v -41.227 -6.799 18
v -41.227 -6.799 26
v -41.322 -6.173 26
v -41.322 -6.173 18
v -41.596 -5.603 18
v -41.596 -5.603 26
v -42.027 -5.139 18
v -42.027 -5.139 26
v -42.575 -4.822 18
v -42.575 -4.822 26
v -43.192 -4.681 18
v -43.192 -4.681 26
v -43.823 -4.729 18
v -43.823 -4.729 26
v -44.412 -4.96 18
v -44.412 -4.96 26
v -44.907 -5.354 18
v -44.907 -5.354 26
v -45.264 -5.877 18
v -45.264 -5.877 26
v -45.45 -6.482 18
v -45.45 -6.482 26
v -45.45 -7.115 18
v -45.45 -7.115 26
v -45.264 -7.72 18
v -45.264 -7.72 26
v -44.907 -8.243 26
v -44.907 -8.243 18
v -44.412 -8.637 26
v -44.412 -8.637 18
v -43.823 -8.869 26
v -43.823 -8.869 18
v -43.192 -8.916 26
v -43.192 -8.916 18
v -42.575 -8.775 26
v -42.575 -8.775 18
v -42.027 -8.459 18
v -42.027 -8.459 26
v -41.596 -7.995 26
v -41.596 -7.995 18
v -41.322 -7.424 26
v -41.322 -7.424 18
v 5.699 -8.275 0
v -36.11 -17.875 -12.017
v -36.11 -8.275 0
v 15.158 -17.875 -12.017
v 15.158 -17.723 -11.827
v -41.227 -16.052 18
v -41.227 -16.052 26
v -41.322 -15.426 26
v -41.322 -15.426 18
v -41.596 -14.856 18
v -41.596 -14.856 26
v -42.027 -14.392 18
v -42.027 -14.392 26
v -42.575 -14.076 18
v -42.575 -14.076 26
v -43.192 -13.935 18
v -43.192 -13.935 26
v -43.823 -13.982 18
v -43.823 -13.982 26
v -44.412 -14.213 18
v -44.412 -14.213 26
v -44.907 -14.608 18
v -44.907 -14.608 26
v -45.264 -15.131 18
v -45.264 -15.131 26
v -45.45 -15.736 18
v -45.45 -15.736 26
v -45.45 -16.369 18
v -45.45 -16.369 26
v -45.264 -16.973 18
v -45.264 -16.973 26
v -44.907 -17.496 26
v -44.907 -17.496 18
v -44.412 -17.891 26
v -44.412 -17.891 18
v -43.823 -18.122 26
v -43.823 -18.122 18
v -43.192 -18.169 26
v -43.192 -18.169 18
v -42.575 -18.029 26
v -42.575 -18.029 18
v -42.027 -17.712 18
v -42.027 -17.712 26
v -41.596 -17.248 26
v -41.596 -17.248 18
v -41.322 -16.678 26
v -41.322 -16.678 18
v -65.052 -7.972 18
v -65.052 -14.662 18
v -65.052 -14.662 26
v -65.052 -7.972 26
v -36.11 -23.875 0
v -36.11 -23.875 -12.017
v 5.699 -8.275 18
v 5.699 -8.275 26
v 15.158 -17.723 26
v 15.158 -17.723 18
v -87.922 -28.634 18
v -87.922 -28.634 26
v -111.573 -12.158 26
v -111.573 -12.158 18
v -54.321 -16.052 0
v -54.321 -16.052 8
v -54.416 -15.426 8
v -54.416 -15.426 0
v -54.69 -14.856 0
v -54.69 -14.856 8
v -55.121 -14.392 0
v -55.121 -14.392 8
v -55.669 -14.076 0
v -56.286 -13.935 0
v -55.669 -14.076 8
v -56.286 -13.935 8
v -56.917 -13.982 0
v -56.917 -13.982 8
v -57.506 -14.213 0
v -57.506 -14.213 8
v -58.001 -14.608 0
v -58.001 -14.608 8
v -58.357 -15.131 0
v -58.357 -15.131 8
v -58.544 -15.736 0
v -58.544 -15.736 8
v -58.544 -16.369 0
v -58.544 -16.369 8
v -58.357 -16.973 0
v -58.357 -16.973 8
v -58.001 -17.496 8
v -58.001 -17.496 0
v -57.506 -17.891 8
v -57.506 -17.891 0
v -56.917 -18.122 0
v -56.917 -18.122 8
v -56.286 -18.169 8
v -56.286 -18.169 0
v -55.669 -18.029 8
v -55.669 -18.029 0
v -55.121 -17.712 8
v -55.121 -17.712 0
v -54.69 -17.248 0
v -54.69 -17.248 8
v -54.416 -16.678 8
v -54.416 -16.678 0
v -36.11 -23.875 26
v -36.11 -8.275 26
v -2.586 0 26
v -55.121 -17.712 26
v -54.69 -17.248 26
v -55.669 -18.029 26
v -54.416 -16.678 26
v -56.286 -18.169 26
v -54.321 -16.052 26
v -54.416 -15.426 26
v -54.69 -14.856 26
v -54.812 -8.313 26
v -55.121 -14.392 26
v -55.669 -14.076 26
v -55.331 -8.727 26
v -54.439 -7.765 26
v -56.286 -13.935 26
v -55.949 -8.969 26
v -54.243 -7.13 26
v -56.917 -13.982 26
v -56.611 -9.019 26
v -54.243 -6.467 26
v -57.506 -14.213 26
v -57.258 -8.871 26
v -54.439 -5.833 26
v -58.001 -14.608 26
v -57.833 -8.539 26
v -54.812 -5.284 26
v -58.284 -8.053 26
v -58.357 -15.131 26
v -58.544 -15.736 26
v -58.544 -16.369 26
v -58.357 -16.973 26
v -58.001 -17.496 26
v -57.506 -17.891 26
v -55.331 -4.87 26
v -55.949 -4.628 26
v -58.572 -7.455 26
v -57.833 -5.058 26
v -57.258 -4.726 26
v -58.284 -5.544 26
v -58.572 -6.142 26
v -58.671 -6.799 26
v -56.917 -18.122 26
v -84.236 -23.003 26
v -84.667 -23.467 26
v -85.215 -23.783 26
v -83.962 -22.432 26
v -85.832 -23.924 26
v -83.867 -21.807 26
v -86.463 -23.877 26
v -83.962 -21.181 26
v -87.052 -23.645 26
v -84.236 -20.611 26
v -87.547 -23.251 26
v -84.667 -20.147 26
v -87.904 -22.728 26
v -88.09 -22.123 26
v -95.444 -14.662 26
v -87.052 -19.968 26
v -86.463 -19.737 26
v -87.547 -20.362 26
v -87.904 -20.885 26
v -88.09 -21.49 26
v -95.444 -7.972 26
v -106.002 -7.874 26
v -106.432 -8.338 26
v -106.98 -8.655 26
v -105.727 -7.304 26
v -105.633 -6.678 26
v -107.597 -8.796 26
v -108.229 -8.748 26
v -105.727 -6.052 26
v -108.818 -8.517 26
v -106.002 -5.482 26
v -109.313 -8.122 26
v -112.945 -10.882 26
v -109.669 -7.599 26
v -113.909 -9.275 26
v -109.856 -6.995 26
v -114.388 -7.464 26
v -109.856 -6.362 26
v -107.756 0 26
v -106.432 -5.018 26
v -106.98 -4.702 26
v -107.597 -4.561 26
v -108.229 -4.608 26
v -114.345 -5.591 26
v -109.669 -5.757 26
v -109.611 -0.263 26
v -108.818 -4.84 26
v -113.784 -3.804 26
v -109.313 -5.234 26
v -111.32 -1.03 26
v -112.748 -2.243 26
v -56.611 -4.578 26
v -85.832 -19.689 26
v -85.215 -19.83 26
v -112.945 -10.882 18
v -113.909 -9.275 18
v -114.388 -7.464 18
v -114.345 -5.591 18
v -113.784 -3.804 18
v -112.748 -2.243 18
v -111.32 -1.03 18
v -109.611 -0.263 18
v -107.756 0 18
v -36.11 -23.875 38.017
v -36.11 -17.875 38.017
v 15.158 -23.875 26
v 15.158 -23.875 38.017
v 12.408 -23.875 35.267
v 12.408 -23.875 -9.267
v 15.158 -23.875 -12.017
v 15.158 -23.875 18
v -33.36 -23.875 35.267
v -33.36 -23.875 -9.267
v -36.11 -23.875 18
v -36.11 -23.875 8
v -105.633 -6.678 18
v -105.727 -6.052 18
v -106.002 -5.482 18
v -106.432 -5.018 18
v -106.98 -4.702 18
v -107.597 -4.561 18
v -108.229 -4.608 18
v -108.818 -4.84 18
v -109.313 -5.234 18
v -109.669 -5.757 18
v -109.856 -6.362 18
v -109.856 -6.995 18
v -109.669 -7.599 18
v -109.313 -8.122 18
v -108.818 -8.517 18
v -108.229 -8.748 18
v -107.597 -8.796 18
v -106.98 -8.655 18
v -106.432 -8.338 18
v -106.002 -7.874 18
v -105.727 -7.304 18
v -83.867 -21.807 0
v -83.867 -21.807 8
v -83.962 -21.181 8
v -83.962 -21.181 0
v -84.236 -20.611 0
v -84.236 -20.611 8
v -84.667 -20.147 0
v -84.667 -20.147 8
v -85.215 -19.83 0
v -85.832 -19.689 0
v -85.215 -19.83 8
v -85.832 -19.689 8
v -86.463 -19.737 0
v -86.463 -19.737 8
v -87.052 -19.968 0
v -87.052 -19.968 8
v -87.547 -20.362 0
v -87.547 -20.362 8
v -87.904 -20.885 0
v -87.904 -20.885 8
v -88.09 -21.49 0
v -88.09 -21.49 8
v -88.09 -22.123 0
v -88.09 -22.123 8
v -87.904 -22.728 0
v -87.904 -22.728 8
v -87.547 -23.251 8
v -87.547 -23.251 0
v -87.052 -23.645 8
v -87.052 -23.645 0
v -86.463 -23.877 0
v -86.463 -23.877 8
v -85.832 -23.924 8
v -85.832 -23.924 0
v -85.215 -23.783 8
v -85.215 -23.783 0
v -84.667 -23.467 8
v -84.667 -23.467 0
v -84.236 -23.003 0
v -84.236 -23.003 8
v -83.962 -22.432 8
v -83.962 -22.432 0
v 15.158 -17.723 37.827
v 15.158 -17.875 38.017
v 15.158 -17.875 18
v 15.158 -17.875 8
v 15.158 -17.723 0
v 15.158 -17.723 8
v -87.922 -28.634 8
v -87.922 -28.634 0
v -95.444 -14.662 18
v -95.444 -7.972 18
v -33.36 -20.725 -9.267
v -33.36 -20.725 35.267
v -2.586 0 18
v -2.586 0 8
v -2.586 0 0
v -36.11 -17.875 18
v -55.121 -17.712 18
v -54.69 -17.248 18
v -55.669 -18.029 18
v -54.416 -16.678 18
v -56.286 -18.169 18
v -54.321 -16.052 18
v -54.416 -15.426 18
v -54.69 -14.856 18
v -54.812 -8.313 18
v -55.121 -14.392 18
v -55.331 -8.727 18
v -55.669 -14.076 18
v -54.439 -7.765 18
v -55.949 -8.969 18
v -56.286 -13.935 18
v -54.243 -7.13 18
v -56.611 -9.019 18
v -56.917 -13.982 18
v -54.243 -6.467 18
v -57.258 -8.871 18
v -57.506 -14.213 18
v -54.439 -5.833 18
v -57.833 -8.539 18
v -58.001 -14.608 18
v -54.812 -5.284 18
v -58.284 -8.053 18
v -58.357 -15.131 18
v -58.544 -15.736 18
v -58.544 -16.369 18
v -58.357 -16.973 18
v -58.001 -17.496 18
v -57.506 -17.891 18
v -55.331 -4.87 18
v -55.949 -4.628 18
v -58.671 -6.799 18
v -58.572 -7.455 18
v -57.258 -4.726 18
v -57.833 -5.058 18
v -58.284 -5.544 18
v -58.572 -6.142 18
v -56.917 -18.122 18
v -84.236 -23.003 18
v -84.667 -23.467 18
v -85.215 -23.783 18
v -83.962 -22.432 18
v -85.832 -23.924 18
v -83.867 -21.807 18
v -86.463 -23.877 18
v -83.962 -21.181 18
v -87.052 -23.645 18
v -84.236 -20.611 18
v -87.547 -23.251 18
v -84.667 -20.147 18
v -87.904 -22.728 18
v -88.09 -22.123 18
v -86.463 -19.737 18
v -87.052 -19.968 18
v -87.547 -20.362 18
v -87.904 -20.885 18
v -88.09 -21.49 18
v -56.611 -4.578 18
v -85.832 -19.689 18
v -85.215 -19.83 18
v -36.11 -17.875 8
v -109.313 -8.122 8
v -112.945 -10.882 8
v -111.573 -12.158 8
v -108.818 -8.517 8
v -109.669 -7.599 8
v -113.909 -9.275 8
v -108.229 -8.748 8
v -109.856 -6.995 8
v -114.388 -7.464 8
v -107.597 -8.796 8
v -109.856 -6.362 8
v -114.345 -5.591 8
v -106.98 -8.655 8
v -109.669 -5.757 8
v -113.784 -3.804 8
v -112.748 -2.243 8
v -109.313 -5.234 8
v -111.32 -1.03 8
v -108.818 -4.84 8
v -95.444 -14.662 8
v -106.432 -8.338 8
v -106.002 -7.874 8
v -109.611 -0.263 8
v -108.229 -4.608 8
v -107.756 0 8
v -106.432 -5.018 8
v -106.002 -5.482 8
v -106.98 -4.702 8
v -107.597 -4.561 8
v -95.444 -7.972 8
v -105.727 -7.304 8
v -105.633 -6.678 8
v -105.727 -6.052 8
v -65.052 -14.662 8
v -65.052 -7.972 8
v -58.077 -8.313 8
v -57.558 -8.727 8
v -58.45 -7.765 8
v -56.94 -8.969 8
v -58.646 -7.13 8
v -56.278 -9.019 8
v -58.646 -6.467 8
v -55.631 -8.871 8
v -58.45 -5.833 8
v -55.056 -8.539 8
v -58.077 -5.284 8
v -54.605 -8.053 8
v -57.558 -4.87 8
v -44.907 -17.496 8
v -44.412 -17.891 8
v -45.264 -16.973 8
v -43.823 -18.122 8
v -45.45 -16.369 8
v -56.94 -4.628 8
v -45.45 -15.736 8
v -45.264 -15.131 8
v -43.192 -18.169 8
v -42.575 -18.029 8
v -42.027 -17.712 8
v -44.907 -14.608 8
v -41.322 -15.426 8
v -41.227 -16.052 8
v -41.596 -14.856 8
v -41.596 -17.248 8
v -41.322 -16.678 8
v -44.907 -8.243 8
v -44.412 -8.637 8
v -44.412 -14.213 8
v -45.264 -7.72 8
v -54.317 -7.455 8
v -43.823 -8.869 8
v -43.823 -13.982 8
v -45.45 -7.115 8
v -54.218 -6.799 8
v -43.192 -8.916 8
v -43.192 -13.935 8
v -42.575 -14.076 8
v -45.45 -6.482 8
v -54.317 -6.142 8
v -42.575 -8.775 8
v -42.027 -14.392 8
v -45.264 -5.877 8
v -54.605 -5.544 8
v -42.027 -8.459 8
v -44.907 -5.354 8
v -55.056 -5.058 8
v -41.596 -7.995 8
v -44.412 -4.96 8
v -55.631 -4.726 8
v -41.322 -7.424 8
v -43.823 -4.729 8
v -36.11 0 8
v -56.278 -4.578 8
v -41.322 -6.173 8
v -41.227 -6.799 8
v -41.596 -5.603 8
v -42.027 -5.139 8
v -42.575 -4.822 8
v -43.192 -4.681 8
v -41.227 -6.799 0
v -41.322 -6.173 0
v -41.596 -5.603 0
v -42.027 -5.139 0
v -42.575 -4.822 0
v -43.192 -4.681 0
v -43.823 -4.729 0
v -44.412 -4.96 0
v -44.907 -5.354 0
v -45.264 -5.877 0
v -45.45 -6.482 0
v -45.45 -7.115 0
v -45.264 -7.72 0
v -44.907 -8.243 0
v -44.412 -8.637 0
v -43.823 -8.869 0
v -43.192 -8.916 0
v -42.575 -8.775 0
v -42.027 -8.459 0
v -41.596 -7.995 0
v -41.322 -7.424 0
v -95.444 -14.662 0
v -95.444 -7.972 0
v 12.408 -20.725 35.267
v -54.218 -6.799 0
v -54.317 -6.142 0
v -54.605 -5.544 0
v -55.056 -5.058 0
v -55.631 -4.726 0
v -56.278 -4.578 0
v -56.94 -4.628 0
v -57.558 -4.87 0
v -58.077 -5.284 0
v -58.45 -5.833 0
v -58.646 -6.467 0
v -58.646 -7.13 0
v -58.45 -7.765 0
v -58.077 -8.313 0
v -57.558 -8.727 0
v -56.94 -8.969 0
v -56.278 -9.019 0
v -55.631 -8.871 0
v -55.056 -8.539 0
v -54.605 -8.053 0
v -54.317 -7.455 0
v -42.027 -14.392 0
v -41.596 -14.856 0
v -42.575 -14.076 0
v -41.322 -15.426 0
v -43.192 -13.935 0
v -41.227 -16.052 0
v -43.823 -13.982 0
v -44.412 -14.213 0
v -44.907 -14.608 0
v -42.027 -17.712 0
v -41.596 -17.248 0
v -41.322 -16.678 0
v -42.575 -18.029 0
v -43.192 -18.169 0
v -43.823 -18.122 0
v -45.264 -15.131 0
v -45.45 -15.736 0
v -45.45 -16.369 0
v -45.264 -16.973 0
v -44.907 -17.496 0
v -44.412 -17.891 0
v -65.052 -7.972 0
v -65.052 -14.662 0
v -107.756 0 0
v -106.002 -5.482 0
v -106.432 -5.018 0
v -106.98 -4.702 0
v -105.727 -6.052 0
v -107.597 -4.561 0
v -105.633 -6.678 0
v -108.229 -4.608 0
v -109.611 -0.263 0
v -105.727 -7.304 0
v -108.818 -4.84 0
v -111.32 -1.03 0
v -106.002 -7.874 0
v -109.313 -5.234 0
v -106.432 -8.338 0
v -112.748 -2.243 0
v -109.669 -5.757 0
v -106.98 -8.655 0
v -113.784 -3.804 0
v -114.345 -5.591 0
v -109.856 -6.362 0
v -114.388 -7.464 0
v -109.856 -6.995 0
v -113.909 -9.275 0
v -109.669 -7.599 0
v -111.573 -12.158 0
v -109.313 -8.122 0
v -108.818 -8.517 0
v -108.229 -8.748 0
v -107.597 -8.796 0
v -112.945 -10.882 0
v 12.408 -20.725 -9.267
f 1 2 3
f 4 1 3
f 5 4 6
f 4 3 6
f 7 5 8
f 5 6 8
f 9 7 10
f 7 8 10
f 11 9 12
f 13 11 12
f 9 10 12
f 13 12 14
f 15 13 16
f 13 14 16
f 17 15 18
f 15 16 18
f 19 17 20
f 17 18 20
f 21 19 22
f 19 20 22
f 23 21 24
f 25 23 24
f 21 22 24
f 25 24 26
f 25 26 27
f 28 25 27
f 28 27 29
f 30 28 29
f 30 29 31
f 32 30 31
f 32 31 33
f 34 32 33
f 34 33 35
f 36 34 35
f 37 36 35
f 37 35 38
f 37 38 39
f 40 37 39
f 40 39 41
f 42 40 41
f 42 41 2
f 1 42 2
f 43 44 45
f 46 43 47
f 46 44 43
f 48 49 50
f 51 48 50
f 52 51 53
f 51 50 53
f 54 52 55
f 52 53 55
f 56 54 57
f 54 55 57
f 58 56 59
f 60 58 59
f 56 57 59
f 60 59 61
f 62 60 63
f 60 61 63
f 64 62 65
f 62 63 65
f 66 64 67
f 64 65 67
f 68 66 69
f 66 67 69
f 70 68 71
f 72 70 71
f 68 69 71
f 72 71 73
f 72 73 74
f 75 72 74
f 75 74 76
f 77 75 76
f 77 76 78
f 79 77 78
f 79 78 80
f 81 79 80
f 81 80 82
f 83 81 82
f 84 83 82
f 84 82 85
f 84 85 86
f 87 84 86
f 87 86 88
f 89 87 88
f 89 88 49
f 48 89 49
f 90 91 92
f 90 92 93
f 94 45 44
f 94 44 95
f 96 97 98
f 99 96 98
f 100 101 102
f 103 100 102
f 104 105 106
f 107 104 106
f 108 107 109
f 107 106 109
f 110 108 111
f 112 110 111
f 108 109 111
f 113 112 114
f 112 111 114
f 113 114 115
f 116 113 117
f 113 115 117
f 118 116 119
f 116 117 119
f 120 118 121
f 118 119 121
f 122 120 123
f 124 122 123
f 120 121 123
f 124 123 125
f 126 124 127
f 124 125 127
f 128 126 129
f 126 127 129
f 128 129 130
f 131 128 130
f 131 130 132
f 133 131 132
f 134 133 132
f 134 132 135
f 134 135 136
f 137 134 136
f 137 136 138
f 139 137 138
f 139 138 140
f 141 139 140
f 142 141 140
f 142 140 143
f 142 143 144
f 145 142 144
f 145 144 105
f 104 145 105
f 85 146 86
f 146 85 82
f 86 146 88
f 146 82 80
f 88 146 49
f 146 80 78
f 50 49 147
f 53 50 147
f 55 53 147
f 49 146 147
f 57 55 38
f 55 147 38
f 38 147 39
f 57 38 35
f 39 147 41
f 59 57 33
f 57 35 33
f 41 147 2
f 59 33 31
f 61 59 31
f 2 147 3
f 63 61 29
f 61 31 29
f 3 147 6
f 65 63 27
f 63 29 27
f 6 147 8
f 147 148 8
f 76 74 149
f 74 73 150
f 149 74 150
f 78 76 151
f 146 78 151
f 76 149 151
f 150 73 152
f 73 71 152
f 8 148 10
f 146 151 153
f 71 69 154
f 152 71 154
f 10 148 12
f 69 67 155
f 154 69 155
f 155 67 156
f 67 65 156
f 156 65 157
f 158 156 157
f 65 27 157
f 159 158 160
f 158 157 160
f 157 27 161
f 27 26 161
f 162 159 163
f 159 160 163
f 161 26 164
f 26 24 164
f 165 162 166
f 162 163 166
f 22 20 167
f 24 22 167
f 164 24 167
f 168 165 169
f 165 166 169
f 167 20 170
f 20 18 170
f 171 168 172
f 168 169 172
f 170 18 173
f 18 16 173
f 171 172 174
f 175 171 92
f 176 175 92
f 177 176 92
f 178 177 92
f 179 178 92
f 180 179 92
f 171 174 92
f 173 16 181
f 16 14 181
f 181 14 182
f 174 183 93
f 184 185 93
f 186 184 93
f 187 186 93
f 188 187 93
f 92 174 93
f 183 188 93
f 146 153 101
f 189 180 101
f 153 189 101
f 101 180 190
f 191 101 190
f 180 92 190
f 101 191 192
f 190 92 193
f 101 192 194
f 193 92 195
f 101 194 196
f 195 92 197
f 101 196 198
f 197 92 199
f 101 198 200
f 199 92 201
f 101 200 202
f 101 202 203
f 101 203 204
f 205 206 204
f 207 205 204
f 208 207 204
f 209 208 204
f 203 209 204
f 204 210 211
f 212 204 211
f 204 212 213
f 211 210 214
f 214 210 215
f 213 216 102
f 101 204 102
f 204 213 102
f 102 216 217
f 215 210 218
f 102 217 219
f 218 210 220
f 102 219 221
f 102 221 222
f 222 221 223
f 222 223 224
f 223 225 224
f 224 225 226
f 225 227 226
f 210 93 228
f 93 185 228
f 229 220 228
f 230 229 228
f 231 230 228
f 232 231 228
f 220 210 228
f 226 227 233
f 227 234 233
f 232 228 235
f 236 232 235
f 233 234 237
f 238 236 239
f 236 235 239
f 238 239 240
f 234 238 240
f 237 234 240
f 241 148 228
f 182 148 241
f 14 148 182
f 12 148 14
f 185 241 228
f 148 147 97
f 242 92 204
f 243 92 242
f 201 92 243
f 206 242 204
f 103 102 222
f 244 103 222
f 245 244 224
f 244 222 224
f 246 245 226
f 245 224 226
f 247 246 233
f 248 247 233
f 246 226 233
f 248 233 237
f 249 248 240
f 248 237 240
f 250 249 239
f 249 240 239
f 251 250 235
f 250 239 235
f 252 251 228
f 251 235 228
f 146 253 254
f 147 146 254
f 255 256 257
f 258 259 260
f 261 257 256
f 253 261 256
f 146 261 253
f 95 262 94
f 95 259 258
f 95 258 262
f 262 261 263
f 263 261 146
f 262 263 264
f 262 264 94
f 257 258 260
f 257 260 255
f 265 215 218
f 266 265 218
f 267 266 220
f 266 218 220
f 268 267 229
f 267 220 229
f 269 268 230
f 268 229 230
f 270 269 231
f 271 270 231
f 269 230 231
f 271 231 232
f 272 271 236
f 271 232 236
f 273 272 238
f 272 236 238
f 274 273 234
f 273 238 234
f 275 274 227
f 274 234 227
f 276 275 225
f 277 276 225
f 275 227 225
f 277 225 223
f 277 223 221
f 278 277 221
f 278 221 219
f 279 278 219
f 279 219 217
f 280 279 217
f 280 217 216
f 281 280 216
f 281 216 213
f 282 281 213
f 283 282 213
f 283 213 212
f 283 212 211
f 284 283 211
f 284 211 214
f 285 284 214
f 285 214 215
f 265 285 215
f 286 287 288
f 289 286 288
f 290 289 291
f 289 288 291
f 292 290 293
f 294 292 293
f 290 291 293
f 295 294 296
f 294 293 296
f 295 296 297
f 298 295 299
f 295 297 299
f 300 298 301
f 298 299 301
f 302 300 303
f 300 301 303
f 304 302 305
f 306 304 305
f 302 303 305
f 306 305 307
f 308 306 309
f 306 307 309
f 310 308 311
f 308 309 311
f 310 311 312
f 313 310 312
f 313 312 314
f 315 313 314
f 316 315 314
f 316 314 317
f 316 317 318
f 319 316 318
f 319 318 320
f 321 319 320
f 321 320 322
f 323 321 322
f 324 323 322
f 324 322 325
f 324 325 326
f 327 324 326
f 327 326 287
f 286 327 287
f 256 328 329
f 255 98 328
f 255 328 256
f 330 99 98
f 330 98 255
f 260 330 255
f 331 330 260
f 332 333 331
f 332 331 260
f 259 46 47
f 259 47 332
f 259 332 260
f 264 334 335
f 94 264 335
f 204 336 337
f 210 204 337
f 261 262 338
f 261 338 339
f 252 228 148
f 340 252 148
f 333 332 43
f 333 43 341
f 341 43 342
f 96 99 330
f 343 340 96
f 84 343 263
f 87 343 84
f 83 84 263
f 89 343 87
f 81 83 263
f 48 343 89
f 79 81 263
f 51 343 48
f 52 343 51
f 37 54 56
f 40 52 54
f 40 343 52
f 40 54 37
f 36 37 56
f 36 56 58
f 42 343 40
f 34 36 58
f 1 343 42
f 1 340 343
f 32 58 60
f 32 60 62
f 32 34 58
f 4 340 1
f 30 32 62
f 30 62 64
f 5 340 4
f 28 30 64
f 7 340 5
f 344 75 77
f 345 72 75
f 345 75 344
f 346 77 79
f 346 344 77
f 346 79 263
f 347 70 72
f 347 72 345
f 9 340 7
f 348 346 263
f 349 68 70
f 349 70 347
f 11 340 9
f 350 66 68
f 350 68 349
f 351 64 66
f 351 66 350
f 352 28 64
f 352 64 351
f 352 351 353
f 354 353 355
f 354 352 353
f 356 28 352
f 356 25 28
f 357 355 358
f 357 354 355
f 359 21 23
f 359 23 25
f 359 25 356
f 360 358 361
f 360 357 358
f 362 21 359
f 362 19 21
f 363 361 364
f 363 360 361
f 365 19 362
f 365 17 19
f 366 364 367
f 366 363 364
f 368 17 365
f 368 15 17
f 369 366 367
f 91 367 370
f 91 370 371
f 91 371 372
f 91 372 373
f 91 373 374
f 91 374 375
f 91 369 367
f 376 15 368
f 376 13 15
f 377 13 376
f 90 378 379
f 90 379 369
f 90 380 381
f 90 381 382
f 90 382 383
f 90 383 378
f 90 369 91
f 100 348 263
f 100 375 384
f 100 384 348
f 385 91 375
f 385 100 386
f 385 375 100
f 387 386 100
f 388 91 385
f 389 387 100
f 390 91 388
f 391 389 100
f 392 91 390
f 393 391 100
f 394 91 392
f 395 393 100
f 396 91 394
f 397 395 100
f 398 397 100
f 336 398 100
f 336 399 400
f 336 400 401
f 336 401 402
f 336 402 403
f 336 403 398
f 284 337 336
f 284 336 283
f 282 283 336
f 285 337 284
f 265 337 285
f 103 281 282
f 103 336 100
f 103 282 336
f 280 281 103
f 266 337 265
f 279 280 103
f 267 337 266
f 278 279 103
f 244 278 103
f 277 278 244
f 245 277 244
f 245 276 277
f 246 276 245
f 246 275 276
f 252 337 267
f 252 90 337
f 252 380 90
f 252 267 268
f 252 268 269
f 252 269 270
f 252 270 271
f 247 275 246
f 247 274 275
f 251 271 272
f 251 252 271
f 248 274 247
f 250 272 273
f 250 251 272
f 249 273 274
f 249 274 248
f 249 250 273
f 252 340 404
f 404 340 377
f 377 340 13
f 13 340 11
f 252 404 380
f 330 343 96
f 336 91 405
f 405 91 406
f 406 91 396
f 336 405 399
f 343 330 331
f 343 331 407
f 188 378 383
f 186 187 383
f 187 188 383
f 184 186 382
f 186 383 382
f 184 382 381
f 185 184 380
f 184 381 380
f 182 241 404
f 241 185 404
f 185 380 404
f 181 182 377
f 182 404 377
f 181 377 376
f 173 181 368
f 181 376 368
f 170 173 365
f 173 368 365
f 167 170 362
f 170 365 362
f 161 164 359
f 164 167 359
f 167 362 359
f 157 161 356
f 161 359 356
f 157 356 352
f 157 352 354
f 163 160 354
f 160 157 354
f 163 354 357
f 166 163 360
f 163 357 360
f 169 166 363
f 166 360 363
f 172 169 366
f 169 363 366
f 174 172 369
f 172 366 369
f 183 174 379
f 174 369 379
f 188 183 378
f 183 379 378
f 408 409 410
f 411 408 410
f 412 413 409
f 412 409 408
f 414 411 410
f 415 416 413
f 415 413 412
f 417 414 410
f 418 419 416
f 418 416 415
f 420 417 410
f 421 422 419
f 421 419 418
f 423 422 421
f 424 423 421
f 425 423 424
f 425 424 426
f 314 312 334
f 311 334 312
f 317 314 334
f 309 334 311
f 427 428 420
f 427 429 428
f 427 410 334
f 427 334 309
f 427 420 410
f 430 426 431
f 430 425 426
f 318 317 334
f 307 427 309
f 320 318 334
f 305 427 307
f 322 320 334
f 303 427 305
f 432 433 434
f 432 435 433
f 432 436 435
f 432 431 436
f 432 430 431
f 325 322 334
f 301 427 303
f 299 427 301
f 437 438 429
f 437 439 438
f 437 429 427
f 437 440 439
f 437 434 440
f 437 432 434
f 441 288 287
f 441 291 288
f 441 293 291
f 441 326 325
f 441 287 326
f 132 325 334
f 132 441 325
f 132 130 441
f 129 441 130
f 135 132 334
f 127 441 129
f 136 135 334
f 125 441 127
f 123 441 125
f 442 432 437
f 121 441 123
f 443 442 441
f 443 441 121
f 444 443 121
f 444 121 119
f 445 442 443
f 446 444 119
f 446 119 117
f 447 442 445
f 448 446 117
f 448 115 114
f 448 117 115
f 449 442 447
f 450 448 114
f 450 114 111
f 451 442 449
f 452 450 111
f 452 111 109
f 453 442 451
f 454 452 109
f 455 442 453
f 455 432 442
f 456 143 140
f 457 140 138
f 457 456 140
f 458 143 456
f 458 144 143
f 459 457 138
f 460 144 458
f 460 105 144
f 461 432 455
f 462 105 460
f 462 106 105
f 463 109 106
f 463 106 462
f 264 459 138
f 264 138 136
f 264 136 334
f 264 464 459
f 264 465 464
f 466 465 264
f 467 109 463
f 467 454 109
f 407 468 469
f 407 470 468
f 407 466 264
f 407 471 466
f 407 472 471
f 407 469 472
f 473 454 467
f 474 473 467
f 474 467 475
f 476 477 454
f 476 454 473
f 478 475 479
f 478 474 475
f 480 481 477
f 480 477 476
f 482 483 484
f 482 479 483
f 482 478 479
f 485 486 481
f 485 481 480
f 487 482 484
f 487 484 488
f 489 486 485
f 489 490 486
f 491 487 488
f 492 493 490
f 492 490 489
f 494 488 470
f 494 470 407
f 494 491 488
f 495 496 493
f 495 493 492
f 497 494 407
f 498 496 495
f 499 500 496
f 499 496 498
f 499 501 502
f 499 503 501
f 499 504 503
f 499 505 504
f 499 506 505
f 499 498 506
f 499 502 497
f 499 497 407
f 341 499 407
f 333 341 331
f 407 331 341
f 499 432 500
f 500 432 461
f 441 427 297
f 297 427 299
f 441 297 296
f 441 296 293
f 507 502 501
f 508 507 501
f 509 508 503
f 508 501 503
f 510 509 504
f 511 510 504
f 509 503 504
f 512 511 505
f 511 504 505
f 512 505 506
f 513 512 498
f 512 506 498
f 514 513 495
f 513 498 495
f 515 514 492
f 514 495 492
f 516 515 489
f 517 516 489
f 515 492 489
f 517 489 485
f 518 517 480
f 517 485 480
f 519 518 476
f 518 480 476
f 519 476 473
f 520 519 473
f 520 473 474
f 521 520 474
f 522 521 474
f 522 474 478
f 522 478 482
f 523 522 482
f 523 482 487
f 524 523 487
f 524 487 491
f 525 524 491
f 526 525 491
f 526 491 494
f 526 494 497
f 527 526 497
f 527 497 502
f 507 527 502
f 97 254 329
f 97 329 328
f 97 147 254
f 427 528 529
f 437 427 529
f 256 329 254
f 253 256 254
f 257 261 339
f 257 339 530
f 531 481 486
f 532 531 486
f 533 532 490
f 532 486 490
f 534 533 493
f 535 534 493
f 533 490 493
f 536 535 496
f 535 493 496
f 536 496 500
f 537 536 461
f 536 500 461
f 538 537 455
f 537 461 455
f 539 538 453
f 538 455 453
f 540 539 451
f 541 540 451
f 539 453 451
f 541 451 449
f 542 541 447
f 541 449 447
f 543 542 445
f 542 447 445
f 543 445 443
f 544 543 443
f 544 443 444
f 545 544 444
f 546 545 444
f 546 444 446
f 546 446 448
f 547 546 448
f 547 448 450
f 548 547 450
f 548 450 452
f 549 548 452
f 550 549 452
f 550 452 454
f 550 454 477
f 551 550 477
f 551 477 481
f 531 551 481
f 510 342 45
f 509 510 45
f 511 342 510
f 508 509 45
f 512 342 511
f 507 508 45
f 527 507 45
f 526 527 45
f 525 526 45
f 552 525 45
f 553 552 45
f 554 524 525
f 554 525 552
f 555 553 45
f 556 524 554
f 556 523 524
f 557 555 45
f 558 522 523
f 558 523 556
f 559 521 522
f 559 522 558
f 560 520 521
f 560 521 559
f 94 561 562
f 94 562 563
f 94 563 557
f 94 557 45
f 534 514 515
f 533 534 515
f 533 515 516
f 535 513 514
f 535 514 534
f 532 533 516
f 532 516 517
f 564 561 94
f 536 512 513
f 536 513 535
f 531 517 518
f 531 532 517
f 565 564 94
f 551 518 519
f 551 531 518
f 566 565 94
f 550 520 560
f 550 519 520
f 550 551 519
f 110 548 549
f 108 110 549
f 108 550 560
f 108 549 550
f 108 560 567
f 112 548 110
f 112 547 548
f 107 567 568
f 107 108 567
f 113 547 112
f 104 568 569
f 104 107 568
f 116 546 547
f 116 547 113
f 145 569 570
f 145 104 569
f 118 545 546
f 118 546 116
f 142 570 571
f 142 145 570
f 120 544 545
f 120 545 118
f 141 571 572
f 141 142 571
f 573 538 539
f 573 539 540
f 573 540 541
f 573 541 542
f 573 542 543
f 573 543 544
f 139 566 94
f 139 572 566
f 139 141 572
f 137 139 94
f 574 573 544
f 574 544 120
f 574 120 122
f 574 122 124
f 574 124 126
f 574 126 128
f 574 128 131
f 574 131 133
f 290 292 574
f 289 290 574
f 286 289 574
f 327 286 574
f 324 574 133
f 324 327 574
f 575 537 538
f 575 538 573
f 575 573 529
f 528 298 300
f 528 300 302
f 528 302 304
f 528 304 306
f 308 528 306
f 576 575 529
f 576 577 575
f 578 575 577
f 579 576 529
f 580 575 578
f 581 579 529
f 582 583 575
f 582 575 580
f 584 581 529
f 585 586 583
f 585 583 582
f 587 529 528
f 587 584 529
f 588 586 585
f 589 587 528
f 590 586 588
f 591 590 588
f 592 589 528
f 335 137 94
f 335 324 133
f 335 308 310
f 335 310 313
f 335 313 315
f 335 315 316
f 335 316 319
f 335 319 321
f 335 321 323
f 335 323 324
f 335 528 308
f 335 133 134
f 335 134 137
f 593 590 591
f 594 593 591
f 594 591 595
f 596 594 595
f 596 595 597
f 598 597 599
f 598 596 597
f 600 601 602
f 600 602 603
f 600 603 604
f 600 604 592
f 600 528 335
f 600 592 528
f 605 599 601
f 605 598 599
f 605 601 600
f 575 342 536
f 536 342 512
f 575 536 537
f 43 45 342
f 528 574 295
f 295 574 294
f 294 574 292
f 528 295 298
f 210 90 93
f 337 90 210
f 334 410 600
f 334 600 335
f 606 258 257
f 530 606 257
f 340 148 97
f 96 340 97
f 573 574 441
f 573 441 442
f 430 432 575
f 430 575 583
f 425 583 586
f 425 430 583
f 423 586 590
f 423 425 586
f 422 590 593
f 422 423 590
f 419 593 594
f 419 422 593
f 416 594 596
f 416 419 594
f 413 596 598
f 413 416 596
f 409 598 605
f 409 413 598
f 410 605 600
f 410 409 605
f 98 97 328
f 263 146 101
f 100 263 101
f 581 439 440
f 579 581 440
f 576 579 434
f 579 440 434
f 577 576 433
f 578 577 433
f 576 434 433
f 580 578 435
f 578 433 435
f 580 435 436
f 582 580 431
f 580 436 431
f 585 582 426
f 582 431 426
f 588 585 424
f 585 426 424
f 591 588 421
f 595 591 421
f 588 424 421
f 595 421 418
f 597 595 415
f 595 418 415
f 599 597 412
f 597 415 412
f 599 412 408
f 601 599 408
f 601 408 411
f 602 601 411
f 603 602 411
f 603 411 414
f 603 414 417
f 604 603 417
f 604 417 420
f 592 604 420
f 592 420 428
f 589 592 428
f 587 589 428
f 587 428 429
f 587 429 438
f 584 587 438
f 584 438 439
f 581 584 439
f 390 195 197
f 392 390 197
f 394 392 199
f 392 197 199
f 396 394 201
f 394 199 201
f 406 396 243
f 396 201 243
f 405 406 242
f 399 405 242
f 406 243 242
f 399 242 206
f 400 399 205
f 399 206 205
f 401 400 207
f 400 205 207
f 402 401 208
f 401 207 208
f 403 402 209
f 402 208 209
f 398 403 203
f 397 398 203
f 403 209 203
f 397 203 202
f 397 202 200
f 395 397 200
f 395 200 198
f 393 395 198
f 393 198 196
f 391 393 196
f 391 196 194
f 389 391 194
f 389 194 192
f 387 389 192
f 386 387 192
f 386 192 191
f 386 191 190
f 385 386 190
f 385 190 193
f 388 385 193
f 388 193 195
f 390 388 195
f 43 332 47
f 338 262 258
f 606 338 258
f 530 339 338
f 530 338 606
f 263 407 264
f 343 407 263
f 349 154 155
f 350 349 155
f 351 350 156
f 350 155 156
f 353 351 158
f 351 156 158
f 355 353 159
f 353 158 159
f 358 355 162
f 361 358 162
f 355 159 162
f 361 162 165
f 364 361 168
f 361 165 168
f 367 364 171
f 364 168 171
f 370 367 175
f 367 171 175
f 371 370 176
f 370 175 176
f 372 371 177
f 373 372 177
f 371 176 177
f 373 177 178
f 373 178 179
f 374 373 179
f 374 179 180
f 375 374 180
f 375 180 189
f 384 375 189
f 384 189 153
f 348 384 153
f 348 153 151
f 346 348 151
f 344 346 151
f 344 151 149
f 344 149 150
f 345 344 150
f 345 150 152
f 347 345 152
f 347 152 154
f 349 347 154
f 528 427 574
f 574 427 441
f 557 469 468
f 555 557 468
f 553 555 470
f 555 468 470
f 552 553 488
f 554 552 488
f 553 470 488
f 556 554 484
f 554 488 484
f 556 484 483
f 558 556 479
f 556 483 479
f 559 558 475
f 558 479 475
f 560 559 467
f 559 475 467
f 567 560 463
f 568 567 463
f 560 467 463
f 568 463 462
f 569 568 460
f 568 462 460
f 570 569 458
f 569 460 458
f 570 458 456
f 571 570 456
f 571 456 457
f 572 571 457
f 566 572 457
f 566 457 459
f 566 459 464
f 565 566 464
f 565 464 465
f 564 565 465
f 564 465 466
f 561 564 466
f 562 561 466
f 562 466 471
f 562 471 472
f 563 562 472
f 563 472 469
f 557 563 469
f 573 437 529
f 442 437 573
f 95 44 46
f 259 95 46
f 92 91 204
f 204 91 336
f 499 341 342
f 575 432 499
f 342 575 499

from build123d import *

# Parameters (mm, degrees)
RESSALTO_EXTRUS_O1_DEPTH         = 8
RESSALTO_EXTRUS_O2_DEPTH         = 51.268117765
CORTE_EXTRUS_O1_DEPTH            = 8.000000002
ESBO_O4_W                        = 51.268117776
ESBO_O4_H                        = 10.000000011
CORTE_EXTRUS_O2_DEPTH            = 17.723100001
CORTE_EXTRUS_O3_DEPTH            = 40.852574409
ESBO_O6_W                        = 51.268117776
ESBO_O6_H                        = 10.000000011
CORTE_EXTRUS_O4_DEPTH            = 0.151992449
RESSALTO_EXTRUS_O3_START         = 7.999999998
RESSALTO_EXTRUS_O3_DEPTH         = 7.999999998
RESSALTO_EXTRUS_O4_DEPTH         = 12.017232655
RESSALTO_EXTRUS_O5_DEPTH         = 12.017232657
ESBO_O10_W                       = 30.391419991
ESBO_O10_H                       = 6.689959998
CORTE_EXTRUS_O5_DEPTH            = 135.855194678
ESBO_O11_W                       = 30.391419991
ESBO_O11_H                       = 6.689959998
CORTE_EXTRUS_O6_DEPTH            = 135.855194677
ESBO_O12_W                       = 45.768117767
ESBO_O12_H                       = 44.53446532
CORTE_EXTRUS_O7_DEPTH            = 3.15
INCLINA_O1_START                 = 9.762479363
INCLINA_O1_DEPTH                 = 8.237520637
INCLINA_O2_START                 = -6.465378083
INCLINA_O2_DEPTH                 = 8.465378083
INCLINA_O3_ANGLE                 = 84.752120974
FURO_COM_FOLGA_DE_M41_D          = 4.452840696
FURO_COM_FOLGA_DE_M41_DEPTH      = 7.999999998
FURO_DE_DI_METRO_4_2_4_2_1_D     = 4.2
FURO_DE_DI_METRO_4_2_4_2_1_DEPTH = 7.999999998
FURO_COM_FOLGA_DE_M42_D          = 4.452840696
FURO_COM_FOLGA_DE_M42_DEPTH      = 38.017232657
FURO1_D                          = 4.246430182
FURO1_DEPTH                      = 38.017232657


with BuildPart() as part:
    # Esboço1 → Ressalto-extrusão1 (new body)
    with BuildSketch(Plane.XY.offset(8)):
        with BuildLine():
            Line((-36.110267765, -64.727666859), (-36.110267765, 0))
            Line((-36.110267765, 0), (-107.75607805, 0))
            ThreePointArc((-107.75607805, 0), (-114.12766225, -4.677735132), (-111.573397577, -12.157977319))
            Line((-111.573397577, -12.157977319), (-36.110267765, -64.727666859))
        make_face()
    extrude(amount=-RESSALTO_EXTRUS_O1_DEPTH)

    # Esboço2 → Ressalto-extrusão2 (add)
    with BuildSketch(Plane(origin=(-36.110267765, 0, 0), x_dir=(0, 0, -1), z_dir=(1, 0, 0))):
        with BuildLine():
            Line((2e-09, 1e-09), (2e-09, -23.87509245))
            add(Edge.make_bspline(
                [(2e-09, -64.727666859), (2e-09, -51.110142056), (2e-09, -37.492617253), (2e-09, -23.87509245)],
                knots=[0, 0, 0, 0, 1, 1, 1, 1], degree=3))
            Line((2e-09, -64.727666859), (-18.000000002, -64.727666859))
            add(Edge.make_bspline(
                [(-18.000000002, -64.727666859), (-18.000000002, -51.110142056), (-18.000000002, -37.492617253), (-18.000000002, -23.87509245)],
                knots=[0, 0, 0, 0, 1, 1, 1, 1], degree=3))
            Line((-18.000000002, -23.87509245), (-18.000000002, -17.875092449))
            add(Edge.make_bspline(
                [(-18.000000002, -17.723099999), (-18.000000002, -17.773764149), (-18.000000002, -17.824428299), (-18.000000002, -17.875092449)],
                knots=[0, 0, 0, 0, 1, 1, 1, 1], degree=3))
            add(Edge.make_bspline(
                [(-18.000000002, 1e-09), (-18.000000002, -5.907699999), (-18.000000002, -11.815399999), (-18.000000002, -17.723099999)],
                knots=[0, 0, 0, 0, 1, 1, 1, 1], degree=3))
            Line((-18.000000002, 1e-09), (2e-09, 1e-09))
        make_face()
    extrude(amount=RESSALTO_EXTRUS_O2_DEPTH)

    # Esboço3 → Corte-extrusão1 (cut)
    with BuildSketch(Plane(origin=(0, 0, 0), x_dir=(-1, 0, 0), z_dir=(0, 0, -1))):
        Polygon((-15.15785, 0), (-15.15785, -17.7231), (2.585682, 0), align=None)
    extrude(amount=-CORTE_EXTRUS_O1_DEPTH, mode=Mode.SUBTRACT)

    # Esboço4 → Corte-extrusão2 (cut)
    with BuildSketch(Plane(origin=(0, 0, 0), x_dir=(-1, 0, 0), z_dir=(0, 1, 0))):
        with Locations((10.476208888, 13.000000002)):
            Rectangle(ESBO_O4_W, ESBO_O4_H)
    extrude(amount=-CORTE_EXTRUS_O2_DEPTH, mode=Mode.SUBTRACT)

    # Esboço5 → Corte-extrusão3 (cut)
    with BuildSketch(Plane.XZ.offset(64.727666859)):
        Polygon((15.15785, 18.000000002), (-36.110267765, 18.000000002), (-36.110267765, 8), (-36.110267765, -2e-09), (15.15785, -2e-09), align=None)
    extrude(amount=-CORTE_EXTRUS_O3_DEPTH, mode=Mode.SUBTRACT)

    # Esboço6 → Corte-extrusão4 (cut)
    with BuildSketch(Plane(origin=(0, -17.723100001, 0), x_dir=(-1, 0, 0), z_dir=(0, 1, 0))):
        with Locations((10.476208888, 13.000000002)):
            Rectangle(ESBO_O6_W, ESBO_O6_H)
    extrude(amount=-CORTE_EXTRUS_O4_DEPTH, mode=Mode.SUBTRACT)

    # Esboço7 → Ressalto-extrusão3 (add)
    with BuildSketch(Plane.XY.offset(18.000000002).offset(RESSALTO_EXTRUS_O3_START)):
        with BuildLine():
            Line((-36.110267767, -23.87509245), (-36.110267767, -64.727666793))
            Line((-36.110267767, -64.727666793), (-111.573397573, -12.157977315))
            ThreePointArc((-111.573397573, -12.157977315), (-114.127662248, -4.677735132), (-107.75607805, 1e-09))
            Line((-107.75607805, 1e-09), (-2.585681995, 1e-09))
            Line((-2.585681995, 1e-09), (5.698950337, -8.275092449))
            Line((5.698950337, -8.275092449), (15.157849978, -17.723100021))
            Line((15.157849978, -17.723100021), (15.157849978, -23.87509245))
            Line((15.157849978, -23.87509245), (-36.110267767, -23.87509245))
        make_face()
    extrude(amount=-RESSALTO_EXTRUS_O3_DEPTH)

    # Esboço8 → Ressalto-extrusão4 (add)
    with BuildSketch(Plane(origin=(0, 0, 0), x_dir=(-1, 0, 0), z_dir=(0, 0, -1))):
        Polygon((36.110267765, -8.275092449), (36.110267765, -23.87509245), (-15.15785, -23.87509245), (-15.15785, -17.7231), (-5.698950354, -8.275092449), align=None)
    extrude(amount=RESSALTO_EXTRUS_O4_DEPTH)

    # Esboço9 → Ressalto-extrusão5 (add)
    with BuildSketch(Plane.XY.offset(26)):
        Polygon((15.15785, -17.7231), (15.15785, -23.87509245), (-36.110267765, -23.87509245), (-36.110267765, -8.275092449), (5.698950354, -8.275092449), align=None)
    extrude(amount=RESSALTO_EXTRUS_O5_DEPTH)

    # Esboço10 → Corte-extrusão5 (cut, through all)
    with BuildSketch(Plane.XY.offset(8)):
        with Locations((-80.248070001, -11.317270001)):
            Rectangle(ESBO_O10_W, ESBO_O10_H)
    extrude(amount=-CORTE_EXTRUS_O5_DEPTH, mode=Mode.SUBTRACT)

    # Esboço11 → Corte-extrusão6 (cut, through all)
    with BuildSketch(Plane(origin=(0, 0, 18.000000002), x_dir=(-1, 0, 0), z_dir=(0, 0, -1))):
        with Locations((80.248070001, -11.317270001)):
            Rectangle(ESBO_O11_W, ESBO_O11_H)
    extrude(amount=-CORTE_EXTRUS_O6_DEPTH, mode=Mode.SUBTRACT)

    # Esboço12 → Corte-extrusão7 (cut)
    with BuildSketch(Plane.XZ.offset(23.87509245)):
        with Locations((-10.476208882, 13)):
            Rectangle(ESBO_O12_W, ESBO_O12_H)
    extrude(amount=-CORTE_EXTRUS_O7_DEPTH, mode=Mode.SUBTRACT)

    # Inclinação1: read off the stored shape, not the designer's step
    # Inclinação1 outline → Inclinação1 (cut)
    with BuildSketch(Plane(origin=(0, 0, 0), x_dir=(1, 0, 0), z_dir=(0, 0.7813058431702609, 0.624148363314371)).offset(INCLINA_O1_START)):
        Polygon((-36.110267765, -40.859795712), (15.15785, -40.859795712), (15.15785, -40.616276003), (5.698950337, -25.478837331), (-36.110267765, -25.478837331), align=None)
    extrude(amount=INCLINA_O1_DEPTH, mode=Mode.SUBTRACT)

    # Inclinação2: read off the stored shape, not the designer's step
    # Inclinação2 outline → Inclinação2 (cut)
    with BuildSketch(Plane(origin=(0, 0, 0), x_dir=(1, 0, 0), z_dir=(0, 0.7813058431702609, -0.624148363314371)).offset(INCLINA_O2_START)):
        Polygon((5.698950354, 5.164885408), (15.15785, 20.302324047), (15.15785, 20.545843787), (-36.110267765, 20.545843787), (-36.110267765, 5.164885408), align=None)
    extrude(amount=INCLINA_O2_DEPTH, mode=Mode.SUBTRACT)

    # Inclinação3
    inclina_o3_faces = [part.faces().sort_by_distance(p)[0] for p in [
        (-36.110267765, -44.301379654, 3.999999999),
        (-36.110267767, -44.301379621, 22.000000001),
    ]]
    draft(inclina_o3_faces, Plane(origin=(0, -23.87509245, 0), x_dir=(0, 0, -1), z_dir=(0, -1, 0)), INCLINA_O3_ANGLE)

    # Furo com folga de M41
    with Locations(Plane.XY.offset(26)):
        with Locations((-56.444514416, -6.798608997)):
            Hole(FURO_COM_FOLGA_DE_M41_D / 2, depth=FURO_COM_FOLGA_DE_M41_DEPTH)

    # Furo de diâmetro Ø4.2 (4.2)1
    with Locations(Plane.XY.offset(26)):
        with Locations((-85.990622049, -21.806552958), (-107.75607805, -6.678263028), (-43.350632153, -6.798608997), (-56.444514416, -16.052089875), (-43.350632153, -16.052089875)):
            Hole(FURO_DE_DI_METRO_4_2_4_2_1_D / 2, depth=FURO_DE_DI_METRO_4_2_4_2_1_DEPTH)

    # Furo com folga de M42
    with Locations(Plane(origin=(0, 0, 0), x_dir=(-1, 0, 0), z_dir=(0, 0, -1))):
        with Locations((56.444514416, -6.798608997)):
            Hole(FURO_COM_FOLGA_DE_M42_D / 2, depth=FURO_COM_FOLGA_DE_M42_DEPTH)

    # Furo1
    with Locations(Plane(origin=(0, 0, 0), x_dir=(-1, 0, 0), z_dir=(0, 0, -1))):
        with Locations((43.350632153, -16.052089875), (56.444514416, -16.052089875), (43.350632153, -6.798608997), (107.75607805, -6.678263028), (85.990622049, -21.806552958)):
            Hole(FURO1_D / 2, depth=FURO1_DEPTH)


solid = part.part
